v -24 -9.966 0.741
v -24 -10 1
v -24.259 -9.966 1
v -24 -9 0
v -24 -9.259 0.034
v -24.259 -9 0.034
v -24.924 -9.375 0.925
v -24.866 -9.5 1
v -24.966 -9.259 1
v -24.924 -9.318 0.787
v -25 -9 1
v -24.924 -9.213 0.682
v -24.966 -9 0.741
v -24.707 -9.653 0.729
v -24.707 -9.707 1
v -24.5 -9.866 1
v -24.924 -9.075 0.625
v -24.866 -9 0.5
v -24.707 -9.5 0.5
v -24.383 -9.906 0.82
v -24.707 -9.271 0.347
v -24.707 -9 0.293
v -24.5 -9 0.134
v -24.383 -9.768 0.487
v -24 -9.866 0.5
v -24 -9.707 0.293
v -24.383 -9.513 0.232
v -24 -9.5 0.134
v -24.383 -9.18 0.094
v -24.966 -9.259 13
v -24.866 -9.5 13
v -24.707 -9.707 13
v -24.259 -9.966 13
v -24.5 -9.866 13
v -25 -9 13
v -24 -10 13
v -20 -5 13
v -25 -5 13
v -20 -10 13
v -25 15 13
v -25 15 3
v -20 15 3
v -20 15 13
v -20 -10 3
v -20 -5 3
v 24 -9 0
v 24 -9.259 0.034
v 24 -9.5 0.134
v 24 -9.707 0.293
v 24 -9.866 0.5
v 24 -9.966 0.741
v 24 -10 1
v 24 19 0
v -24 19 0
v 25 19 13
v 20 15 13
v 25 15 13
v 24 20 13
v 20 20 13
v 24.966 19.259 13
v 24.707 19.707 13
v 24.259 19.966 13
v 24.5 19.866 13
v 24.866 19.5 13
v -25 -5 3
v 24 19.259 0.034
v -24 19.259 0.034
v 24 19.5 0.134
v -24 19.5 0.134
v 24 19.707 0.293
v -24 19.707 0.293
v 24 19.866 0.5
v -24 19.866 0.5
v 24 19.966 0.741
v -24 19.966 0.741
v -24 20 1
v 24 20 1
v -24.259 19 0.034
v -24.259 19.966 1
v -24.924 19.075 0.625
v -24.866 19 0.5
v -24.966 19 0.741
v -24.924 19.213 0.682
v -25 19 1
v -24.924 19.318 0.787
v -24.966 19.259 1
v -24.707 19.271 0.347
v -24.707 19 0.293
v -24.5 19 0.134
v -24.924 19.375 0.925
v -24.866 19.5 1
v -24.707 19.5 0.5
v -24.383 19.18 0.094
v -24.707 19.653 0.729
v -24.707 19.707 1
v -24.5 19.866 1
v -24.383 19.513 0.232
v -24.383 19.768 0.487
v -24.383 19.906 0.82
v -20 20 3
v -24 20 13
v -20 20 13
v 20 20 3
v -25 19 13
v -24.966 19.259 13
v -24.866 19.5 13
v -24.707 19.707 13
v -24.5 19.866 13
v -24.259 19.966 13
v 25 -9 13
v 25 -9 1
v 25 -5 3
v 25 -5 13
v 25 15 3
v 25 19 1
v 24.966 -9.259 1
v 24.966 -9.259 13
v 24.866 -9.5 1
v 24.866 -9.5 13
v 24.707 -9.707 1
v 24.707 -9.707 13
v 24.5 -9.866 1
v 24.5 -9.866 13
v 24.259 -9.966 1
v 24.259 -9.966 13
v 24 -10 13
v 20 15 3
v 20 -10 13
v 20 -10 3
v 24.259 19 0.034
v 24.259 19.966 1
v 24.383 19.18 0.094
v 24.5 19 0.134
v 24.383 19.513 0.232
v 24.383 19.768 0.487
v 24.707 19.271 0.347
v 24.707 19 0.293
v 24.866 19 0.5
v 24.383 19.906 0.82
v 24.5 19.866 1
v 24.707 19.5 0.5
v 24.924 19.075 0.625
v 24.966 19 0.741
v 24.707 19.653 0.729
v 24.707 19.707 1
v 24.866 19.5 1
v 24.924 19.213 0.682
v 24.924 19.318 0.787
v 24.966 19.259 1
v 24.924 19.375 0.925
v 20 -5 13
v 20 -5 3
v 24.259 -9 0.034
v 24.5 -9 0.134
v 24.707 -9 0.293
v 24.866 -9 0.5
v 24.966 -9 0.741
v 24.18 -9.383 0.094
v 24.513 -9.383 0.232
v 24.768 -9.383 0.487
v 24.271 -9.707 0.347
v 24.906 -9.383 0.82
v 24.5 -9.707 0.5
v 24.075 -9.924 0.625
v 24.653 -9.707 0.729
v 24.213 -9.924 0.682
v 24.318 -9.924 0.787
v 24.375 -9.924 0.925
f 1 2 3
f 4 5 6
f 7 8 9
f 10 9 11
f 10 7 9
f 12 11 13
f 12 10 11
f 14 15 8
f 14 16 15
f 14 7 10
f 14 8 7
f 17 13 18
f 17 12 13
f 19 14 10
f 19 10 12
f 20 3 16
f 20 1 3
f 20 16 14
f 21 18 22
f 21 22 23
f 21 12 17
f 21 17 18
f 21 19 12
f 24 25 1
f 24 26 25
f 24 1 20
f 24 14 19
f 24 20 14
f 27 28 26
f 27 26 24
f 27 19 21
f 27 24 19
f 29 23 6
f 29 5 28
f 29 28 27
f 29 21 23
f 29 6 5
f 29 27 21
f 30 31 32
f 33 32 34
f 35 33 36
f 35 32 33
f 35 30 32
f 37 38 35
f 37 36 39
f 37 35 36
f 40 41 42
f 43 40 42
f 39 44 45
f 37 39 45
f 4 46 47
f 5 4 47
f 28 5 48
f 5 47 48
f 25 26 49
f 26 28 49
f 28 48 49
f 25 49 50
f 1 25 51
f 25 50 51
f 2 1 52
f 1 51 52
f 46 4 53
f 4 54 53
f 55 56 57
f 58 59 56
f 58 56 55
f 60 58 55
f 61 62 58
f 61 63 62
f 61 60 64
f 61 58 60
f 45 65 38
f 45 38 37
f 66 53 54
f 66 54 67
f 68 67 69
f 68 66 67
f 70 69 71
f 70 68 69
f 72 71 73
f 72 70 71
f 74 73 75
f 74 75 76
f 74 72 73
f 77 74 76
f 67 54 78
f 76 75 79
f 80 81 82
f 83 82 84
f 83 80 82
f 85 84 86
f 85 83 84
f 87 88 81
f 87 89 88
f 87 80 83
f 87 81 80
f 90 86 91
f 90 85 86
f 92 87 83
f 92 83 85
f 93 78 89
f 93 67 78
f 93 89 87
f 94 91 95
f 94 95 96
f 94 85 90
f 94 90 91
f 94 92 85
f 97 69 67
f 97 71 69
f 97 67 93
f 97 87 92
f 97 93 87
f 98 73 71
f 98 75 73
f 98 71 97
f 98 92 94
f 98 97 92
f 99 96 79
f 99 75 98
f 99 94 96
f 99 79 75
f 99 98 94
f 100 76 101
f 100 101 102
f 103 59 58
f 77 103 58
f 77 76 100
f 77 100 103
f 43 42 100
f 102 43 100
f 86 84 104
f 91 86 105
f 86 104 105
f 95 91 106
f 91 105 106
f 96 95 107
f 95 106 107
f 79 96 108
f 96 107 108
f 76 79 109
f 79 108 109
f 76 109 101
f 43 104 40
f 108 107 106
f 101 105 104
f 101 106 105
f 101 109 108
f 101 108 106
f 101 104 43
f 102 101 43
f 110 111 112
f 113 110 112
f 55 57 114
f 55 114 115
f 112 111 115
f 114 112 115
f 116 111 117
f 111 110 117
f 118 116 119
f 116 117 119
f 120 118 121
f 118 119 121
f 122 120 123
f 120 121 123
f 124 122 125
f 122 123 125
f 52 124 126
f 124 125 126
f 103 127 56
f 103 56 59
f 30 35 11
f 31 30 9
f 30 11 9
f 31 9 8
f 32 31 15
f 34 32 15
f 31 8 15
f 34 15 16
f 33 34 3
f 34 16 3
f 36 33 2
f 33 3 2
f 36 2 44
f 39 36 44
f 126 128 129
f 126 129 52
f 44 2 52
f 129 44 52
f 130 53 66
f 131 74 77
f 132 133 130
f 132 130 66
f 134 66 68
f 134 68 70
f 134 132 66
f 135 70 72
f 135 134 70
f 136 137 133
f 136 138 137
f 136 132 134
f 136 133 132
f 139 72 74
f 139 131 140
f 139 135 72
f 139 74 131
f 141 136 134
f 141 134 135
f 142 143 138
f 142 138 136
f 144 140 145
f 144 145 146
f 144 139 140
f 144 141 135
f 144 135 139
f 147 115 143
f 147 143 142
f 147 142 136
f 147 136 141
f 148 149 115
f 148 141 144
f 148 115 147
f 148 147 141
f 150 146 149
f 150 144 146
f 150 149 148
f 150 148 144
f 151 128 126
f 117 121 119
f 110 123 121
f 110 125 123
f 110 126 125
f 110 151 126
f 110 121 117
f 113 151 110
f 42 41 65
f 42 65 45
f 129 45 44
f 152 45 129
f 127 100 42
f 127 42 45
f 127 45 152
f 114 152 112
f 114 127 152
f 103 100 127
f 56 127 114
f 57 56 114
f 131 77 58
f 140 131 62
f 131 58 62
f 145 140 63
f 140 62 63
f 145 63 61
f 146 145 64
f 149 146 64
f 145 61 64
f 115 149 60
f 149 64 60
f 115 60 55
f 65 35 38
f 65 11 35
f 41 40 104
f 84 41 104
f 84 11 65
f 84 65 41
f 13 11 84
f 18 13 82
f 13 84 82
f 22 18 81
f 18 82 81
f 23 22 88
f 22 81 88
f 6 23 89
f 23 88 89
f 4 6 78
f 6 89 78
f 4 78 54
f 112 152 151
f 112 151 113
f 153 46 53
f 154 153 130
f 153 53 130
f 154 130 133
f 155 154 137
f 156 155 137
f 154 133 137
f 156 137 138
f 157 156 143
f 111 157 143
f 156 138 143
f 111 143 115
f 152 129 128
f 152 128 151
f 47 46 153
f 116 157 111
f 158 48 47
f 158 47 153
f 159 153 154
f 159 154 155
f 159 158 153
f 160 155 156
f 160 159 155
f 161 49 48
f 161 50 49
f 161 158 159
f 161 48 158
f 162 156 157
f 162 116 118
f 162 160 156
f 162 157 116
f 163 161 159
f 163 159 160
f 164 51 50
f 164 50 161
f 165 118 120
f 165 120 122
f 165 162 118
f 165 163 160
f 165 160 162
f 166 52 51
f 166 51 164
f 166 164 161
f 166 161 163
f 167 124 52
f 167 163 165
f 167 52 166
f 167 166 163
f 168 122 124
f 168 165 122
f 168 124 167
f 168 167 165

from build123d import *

# Parameters (mm, degrees)
F0_W     = 50
F0_H     = 30
F1_DEPTH = 3
F2_W     = 5
F2_H     = 5
F3_DEPTH = 10
F4_R     = 1
F5_R     = 1
F6_R     = 1
F7_R     = 1


with BuildPart() as f1:
    # F0 (on Top) → F1 (new body)
    with BuildSketch(Plane.XY):
        with Locations((0, 5)):
            Rectangle(F0_W, F0_H)
    extrude(amount=F1_DEPTH)

    # F2 (on face) → F3 (join)
    with BuildSketch(Plane.XY.offset(3)):
        with Locations((-22.5, 17.5)):
            Rectangle(F2_W, F2_H)
        with Locations((22.5, 17.5)):
            Rectangle(F2_W, F2_H)
        with Locations((22.5, -7.5)):
            Rectangle(F2_W, F2_H)
        with Locations((-22.5, -7.5)):
            Rectangle(F2_W, F2_H)
    extrude(amount=F3_DEPTH)

    # F4
    f4_edges = [f1.edges().sort_by_distance(p)[0] for p in [
        (0, 20, 0),
    ]]
    fillet(f4_edges, radius=F4_R)

    # F5
    f5_edges = [f1.edges().sort_by_distance(p)[0] for p in [
        (25, 4.5, 0),
    ]]
    fillet(f5_edges, radius=F5_R)

    # F6
    f6_edges = [f1.edges().sort_by_distance(p)[0] for p in [
        (-0.5, -10, 0),
    ]]
    fillet(f6_edges, radius=F6_R)

    # F7
    f7_edges = [f1.edges().sort_by_distance(p)[0] for p in [
        (-25, 5, 0),
    ]]
    fillet(f7_edges, radius=F7_R)


solid = f1.part
